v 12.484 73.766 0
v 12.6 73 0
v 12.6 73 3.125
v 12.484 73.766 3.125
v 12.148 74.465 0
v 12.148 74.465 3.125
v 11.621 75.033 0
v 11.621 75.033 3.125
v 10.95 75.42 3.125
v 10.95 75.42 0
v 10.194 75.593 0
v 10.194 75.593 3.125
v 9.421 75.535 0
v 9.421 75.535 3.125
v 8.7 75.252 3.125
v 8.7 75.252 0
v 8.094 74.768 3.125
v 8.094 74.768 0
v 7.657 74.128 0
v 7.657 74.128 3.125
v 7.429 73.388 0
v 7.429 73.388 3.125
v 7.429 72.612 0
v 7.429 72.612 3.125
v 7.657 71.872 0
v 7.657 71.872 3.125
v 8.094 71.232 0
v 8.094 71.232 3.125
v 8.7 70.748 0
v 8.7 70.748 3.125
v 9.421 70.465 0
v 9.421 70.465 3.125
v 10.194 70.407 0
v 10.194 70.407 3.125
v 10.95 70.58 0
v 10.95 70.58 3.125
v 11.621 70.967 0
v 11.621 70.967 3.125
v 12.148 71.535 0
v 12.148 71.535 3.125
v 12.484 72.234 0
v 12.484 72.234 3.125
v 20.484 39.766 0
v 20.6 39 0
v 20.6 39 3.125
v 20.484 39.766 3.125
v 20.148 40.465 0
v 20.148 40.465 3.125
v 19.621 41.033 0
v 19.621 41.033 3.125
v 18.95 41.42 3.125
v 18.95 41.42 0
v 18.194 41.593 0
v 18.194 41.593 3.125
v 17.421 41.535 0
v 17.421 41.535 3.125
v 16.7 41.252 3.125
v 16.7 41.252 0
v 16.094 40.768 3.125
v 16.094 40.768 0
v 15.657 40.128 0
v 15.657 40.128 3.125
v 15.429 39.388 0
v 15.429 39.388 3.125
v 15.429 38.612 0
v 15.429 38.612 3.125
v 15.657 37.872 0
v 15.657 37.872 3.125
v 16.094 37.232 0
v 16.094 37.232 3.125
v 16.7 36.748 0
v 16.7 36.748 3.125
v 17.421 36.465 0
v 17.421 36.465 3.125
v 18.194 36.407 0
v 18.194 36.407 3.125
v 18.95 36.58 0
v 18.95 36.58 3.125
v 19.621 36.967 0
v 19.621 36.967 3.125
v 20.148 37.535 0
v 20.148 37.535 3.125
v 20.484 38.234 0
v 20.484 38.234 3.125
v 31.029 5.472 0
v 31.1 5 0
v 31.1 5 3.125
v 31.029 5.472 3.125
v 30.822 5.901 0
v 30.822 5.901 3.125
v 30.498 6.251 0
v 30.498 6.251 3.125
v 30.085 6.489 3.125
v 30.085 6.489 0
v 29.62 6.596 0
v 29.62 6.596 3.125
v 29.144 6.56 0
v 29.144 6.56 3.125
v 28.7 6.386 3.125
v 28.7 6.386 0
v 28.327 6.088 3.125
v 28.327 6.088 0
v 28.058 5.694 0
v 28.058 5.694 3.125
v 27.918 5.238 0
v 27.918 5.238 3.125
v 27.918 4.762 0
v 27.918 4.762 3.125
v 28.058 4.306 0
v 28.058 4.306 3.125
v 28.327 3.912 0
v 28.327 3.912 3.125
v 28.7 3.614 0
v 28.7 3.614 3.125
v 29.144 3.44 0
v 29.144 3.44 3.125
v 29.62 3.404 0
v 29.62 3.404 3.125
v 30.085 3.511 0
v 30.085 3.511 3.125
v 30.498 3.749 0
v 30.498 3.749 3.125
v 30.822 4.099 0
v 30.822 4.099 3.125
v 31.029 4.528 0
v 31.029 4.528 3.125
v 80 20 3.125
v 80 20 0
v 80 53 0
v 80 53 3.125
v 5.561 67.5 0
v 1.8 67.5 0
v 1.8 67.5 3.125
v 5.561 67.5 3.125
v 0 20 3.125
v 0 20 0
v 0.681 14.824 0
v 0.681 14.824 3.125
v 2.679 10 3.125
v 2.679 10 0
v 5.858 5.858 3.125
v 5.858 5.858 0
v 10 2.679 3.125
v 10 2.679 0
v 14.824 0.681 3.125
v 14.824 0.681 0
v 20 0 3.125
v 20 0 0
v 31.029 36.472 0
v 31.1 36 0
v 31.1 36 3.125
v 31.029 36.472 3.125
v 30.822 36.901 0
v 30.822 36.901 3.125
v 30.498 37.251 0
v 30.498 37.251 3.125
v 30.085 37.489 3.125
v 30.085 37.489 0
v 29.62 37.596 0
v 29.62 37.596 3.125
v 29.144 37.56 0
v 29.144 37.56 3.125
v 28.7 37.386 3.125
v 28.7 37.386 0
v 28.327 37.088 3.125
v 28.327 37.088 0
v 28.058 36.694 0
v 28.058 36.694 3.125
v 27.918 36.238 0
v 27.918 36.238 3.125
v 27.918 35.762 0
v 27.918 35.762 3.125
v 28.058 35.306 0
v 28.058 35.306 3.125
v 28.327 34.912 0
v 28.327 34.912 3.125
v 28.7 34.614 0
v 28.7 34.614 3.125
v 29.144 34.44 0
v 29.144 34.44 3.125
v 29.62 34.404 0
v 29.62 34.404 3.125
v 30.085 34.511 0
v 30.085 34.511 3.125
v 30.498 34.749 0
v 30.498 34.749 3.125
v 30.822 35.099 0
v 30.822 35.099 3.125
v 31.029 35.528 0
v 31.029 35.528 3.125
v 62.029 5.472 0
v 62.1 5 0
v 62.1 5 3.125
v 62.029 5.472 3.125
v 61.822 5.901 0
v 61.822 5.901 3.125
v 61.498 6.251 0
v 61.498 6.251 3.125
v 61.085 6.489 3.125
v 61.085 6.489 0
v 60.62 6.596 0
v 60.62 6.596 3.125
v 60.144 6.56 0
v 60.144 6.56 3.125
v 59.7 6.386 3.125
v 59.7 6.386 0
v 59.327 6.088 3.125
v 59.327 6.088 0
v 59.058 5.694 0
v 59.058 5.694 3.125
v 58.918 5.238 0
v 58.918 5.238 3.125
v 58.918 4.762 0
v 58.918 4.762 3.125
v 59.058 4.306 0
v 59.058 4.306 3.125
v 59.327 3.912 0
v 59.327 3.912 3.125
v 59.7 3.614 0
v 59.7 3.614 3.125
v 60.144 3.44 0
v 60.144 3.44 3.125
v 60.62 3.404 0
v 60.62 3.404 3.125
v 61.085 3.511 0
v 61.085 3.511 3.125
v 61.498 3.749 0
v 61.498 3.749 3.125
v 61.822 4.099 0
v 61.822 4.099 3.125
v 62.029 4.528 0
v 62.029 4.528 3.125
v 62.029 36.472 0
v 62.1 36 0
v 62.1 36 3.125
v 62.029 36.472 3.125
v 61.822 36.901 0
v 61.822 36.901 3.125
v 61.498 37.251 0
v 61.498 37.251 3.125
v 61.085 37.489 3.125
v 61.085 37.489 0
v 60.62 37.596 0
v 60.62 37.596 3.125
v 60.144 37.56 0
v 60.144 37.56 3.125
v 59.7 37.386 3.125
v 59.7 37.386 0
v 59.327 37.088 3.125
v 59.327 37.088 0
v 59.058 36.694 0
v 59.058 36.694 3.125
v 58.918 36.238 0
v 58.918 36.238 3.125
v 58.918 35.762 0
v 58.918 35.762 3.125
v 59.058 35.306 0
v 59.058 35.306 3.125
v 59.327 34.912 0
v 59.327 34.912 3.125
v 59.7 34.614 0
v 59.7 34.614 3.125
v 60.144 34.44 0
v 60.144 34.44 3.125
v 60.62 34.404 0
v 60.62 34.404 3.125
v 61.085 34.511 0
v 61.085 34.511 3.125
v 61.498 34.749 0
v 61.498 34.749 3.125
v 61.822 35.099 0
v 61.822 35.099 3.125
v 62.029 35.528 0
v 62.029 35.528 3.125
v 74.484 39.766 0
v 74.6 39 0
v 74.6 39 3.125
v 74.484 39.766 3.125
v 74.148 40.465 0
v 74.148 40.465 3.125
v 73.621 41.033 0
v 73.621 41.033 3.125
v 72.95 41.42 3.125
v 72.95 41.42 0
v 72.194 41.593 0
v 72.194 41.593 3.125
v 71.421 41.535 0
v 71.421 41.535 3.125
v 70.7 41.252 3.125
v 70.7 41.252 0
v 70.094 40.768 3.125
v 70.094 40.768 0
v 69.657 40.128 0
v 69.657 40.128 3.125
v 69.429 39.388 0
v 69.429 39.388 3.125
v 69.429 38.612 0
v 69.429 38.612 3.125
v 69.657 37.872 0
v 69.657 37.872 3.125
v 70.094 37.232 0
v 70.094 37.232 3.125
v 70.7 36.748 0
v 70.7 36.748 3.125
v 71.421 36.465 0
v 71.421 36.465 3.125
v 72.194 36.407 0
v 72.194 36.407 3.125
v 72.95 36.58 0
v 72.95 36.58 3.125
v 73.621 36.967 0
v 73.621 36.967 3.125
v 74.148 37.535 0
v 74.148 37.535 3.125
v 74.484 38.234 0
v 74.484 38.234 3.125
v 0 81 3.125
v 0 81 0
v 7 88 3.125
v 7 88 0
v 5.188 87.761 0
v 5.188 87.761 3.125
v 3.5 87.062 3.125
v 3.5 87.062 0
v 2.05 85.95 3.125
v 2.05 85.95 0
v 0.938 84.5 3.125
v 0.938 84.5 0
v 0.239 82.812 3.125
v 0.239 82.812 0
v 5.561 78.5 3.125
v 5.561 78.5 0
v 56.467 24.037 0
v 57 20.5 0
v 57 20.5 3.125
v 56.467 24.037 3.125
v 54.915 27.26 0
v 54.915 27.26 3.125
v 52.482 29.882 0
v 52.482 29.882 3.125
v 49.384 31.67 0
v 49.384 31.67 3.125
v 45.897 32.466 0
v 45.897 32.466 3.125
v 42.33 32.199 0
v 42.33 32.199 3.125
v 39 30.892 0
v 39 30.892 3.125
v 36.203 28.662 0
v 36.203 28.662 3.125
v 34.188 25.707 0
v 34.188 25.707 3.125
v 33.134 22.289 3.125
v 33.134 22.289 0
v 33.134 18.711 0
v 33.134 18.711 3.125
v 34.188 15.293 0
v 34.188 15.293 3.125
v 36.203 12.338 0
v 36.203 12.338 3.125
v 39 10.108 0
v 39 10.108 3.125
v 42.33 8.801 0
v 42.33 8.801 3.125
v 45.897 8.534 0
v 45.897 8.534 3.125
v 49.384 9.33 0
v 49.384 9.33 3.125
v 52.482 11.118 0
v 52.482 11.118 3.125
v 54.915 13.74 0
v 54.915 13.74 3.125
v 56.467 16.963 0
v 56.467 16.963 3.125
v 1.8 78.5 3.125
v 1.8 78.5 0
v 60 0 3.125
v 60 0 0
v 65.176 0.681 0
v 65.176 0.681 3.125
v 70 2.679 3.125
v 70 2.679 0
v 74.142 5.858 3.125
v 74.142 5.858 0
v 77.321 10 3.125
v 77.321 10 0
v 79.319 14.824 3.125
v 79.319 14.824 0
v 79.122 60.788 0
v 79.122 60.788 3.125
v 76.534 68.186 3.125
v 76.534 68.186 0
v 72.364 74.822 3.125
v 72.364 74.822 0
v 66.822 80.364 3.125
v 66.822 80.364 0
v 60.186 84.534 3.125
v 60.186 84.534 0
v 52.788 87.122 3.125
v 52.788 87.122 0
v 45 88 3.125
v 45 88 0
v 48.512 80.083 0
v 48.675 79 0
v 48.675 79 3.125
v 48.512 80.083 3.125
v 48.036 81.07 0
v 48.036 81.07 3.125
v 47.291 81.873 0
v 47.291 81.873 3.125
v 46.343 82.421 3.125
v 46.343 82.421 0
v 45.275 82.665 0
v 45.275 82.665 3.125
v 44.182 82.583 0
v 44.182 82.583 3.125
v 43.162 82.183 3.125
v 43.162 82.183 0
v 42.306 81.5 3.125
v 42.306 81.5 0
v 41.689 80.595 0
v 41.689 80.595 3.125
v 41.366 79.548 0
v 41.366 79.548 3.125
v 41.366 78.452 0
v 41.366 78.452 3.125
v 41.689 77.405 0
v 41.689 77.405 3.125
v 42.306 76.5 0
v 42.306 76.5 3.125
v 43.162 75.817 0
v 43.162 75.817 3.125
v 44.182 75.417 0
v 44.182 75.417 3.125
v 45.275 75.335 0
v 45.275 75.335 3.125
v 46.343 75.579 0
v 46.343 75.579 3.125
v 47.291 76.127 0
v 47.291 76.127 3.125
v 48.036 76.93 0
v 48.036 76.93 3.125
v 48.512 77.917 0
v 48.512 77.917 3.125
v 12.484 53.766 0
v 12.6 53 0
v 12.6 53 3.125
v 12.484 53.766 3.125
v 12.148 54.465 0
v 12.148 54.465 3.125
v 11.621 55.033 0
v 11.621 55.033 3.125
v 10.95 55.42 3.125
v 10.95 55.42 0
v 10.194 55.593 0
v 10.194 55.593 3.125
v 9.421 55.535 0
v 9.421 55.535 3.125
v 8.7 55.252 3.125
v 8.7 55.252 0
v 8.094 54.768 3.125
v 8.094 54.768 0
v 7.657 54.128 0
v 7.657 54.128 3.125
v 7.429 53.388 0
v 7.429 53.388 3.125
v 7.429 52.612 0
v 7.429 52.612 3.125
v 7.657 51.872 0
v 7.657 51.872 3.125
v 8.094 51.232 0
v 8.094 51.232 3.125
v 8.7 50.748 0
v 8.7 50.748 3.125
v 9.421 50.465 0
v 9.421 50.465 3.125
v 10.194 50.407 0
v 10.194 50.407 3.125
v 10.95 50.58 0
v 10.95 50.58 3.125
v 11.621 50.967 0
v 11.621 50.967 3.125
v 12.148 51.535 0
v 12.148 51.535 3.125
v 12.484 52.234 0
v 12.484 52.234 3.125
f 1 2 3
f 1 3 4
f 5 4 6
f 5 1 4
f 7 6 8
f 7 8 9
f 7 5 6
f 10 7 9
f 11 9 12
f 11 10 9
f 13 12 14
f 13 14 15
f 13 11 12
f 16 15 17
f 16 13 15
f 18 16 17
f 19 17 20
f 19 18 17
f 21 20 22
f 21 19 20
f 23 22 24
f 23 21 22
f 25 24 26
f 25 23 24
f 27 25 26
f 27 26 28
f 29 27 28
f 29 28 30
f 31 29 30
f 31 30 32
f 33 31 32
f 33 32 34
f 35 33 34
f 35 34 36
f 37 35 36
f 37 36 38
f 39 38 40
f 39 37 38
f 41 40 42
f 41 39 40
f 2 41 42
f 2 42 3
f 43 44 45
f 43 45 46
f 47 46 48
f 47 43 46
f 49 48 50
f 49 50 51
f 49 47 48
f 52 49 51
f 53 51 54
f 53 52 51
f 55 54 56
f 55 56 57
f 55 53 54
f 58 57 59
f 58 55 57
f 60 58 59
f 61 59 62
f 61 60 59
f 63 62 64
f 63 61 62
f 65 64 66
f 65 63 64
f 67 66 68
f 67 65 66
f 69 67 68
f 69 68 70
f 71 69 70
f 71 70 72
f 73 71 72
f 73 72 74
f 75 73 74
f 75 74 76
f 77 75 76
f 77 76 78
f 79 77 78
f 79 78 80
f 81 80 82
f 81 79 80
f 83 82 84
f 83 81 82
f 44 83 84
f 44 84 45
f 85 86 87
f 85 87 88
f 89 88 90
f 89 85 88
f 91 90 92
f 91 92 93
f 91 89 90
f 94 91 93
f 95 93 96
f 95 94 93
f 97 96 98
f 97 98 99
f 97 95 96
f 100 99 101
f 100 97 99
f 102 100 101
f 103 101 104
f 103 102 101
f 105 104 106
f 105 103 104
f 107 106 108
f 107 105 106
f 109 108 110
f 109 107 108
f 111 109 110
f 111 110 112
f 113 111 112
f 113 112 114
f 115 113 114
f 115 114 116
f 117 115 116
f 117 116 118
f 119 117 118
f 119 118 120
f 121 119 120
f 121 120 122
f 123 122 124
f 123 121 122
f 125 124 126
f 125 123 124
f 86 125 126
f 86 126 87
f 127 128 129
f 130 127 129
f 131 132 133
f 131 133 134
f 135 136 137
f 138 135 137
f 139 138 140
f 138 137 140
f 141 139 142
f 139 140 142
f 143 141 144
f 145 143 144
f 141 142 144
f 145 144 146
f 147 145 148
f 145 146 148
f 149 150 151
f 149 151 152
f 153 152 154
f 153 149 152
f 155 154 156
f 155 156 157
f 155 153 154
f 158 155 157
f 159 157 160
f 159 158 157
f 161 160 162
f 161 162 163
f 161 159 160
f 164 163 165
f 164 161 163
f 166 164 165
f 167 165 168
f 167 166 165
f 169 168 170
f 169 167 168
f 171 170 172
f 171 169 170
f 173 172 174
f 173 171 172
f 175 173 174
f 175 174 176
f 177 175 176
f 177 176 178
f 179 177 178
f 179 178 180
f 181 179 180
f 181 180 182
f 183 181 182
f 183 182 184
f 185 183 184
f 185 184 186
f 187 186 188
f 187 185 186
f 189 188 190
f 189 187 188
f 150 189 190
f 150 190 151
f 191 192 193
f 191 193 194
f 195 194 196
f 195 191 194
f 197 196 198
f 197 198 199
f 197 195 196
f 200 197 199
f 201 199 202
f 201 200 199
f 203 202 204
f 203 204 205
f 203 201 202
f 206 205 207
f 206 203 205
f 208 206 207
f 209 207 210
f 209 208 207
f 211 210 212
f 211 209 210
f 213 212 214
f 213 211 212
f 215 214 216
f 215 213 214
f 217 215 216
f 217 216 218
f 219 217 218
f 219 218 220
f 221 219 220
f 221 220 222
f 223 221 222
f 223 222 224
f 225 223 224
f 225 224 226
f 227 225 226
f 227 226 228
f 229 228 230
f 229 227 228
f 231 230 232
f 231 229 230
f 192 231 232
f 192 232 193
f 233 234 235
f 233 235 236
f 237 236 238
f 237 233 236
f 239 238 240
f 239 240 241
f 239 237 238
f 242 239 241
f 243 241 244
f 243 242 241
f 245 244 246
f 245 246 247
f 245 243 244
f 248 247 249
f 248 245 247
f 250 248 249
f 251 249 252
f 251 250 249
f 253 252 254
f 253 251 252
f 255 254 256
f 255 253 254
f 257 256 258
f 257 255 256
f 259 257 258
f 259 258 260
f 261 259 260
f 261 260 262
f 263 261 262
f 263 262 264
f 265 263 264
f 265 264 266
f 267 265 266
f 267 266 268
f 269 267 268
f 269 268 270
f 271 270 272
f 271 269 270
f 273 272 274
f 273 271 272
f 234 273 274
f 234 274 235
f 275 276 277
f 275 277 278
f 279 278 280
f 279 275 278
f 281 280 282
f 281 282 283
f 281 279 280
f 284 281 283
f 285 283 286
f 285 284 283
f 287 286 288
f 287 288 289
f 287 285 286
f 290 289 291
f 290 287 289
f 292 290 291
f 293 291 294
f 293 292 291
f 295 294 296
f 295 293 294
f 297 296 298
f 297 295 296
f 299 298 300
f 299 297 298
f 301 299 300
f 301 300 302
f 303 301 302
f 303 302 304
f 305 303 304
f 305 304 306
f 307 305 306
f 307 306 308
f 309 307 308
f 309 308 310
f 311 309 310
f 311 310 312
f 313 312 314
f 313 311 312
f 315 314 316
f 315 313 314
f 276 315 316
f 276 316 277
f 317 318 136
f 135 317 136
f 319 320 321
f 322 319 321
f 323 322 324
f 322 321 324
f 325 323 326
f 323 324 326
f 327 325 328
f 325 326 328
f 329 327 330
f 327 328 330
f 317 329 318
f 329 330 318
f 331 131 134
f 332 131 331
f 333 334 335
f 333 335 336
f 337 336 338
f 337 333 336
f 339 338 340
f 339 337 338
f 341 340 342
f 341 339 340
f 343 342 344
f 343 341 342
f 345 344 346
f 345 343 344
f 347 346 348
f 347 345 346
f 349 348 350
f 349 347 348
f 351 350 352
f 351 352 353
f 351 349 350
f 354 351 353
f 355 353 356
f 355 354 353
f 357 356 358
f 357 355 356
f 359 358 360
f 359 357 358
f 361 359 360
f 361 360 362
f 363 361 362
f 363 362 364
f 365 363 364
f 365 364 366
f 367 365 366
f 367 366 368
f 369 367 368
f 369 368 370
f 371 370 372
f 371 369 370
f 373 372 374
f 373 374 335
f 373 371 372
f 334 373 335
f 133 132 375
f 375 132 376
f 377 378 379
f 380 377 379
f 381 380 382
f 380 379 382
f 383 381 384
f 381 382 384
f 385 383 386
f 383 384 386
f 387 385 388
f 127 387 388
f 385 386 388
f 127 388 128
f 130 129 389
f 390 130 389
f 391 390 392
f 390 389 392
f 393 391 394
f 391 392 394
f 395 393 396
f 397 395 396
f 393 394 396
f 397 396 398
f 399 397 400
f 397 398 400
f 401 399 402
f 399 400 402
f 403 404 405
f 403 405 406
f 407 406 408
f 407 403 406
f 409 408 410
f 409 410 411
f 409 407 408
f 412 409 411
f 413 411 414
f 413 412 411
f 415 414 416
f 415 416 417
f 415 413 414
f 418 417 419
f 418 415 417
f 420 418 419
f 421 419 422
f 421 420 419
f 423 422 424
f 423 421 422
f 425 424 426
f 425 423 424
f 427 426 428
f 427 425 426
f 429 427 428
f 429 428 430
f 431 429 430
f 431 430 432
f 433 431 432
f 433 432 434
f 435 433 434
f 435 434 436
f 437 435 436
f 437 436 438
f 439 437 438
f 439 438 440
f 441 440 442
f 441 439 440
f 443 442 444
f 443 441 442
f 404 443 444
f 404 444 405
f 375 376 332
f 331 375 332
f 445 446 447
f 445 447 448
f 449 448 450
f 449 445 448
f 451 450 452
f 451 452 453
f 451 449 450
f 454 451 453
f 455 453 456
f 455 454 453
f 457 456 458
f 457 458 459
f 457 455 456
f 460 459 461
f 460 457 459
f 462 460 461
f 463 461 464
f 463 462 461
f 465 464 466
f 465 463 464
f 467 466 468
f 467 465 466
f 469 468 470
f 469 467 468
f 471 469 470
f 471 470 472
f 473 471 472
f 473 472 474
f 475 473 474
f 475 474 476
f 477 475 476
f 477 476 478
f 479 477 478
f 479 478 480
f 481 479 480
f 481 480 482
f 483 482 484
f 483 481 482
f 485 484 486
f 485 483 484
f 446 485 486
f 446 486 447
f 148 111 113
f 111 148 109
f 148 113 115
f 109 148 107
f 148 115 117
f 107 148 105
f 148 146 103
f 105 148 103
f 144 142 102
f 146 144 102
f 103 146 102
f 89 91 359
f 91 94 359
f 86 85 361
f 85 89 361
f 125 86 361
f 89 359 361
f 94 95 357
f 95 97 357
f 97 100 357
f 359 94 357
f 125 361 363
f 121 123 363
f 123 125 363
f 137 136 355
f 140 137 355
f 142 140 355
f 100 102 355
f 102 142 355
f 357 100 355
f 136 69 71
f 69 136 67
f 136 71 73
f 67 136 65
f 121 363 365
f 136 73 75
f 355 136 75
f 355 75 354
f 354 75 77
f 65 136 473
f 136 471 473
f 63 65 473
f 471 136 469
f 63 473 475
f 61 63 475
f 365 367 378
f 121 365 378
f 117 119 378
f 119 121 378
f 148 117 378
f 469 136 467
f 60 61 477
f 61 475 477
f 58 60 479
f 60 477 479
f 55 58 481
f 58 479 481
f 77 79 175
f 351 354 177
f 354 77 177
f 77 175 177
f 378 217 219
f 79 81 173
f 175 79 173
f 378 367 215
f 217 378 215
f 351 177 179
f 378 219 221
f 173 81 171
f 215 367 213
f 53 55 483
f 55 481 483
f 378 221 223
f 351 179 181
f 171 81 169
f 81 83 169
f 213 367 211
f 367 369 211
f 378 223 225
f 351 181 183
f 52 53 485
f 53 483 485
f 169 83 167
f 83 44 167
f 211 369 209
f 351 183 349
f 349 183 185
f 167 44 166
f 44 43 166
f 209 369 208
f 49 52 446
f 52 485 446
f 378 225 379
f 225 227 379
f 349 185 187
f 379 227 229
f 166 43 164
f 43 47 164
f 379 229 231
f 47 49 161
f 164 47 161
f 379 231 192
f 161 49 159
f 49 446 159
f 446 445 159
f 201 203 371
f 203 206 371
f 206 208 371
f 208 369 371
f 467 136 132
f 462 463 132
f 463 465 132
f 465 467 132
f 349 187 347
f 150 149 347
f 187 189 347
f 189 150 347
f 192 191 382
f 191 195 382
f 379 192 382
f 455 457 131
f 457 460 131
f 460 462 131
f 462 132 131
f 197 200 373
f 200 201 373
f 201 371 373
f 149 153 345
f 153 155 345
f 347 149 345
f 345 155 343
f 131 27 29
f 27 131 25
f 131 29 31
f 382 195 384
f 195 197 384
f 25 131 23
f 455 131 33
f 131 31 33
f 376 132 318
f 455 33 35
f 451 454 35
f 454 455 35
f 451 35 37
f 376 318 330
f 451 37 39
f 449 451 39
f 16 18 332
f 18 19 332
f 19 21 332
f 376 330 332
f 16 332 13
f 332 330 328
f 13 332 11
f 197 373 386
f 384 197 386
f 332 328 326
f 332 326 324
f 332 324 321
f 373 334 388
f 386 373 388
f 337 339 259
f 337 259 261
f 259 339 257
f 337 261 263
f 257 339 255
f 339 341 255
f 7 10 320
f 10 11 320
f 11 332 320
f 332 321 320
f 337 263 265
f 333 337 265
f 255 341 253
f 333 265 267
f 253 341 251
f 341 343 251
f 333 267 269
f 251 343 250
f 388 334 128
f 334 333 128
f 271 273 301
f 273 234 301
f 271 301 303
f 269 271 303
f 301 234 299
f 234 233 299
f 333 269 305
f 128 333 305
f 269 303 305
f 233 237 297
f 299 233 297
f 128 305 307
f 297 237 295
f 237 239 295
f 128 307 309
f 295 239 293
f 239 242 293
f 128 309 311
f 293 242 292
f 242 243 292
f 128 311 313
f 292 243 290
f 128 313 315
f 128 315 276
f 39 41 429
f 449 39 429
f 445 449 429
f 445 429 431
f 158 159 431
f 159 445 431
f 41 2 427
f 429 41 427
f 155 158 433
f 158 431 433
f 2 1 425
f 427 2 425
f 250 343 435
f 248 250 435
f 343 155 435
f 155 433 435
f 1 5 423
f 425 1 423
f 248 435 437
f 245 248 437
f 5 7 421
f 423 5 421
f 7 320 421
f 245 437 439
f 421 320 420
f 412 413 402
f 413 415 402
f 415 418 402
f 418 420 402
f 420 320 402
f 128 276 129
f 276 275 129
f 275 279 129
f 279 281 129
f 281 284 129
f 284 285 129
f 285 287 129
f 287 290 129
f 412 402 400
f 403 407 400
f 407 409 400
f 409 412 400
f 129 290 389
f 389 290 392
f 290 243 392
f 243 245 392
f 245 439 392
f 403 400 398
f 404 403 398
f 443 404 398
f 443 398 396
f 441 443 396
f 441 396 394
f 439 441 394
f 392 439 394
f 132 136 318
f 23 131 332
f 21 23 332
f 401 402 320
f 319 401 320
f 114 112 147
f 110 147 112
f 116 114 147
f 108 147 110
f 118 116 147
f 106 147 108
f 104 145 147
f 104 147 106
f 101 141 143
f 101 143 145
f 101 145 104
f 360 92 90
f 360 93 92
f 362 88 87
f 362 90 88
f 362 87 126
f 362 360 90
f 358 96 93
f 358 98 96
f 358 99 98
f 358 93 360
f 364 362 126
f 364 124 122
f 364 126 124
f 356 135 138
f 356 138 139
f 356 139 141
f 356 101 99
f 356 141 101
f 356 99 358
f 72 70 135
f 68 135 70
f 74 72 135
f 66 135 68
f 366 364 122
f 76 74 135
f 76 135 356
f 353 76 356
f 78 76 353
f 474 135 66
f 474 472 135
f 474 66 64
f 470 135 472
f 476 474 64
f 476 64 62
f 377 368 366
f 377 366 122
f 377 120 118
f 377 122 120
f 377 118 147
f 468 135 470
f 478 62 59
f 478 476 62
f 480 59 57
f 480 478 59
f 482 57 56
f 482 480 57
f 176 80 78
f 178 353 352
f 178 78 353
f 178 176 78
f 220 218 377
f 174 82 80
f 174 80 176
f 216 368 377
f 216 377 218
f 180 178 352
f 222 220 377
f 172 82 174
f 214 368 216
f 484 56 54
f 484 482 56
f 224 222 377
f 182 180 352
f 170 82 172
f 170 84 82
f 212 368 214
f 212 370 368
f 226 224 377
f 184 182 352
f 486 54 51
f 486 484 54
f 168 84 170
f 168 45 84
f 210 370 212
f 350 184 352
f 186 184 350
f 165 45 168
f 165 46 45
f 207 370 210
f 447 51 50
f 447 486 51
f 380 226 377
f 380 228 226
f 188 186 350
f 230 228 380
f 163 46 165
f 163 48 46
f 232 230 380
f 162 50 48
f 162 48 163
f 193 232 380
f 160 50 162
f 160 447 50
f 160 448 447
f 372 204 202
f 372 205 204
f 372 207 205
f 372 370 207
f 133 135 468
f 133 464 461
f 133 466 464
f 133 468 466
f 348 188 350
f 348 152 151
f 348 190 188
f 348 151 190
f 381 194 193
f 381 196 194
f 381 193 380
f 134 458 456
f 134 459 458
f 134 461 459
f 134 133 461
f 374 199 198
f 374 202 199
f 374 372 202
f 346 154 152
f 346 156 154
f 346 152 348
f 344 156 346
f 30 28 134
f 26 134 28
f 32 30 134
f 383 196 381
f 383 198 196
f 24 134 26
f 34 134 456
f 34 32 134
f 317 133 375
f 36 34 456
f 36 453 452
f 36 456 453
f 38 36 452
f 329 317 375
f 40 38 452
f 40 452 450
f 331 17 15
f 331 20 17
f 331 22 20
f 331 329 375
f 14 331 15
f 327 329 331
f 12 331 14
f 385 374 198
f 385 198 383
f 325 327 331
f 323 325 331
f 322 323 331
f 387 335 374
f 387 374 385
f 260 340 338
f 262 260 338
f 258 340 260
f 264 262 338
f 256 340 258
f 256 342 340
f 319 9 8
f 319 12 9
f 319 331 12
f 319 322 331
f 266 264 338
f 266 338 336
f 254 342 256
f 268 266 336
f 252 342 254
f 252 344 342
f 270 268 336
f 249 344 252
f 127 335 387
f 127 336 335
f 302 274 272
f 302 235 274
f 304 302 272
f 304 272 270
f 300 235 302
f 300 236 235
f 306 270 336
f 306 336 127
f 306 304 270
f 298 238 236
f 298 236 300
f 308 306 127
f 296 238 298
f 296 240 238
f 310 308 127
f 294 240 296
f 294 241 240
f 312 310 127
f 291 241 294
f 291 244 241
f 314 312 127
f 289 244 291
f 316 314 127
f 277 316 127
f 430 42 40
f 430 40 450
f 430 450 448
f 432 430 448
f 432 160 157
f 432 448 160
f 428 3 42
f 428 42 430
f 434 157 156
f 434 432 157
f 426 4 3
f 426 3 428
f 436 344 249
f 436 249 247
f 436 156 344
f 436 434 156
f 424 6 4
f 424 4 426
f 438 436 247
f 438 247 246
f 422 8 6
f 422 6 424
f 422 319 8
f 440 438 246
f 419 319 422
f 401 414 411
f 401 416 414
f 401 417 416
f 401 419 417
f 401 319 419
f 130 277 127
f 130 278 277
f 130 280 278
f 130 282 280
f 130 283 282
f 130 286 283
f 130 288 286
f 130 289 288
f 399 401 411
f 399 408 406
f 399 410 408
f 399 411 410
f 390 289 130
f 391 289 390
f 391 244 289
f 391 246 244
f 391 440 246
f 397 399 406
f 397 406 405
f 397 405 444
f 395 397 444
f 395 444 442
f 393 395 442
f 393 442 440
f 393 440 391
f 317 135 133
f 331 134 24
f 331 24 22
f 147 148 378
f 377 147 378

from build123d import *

# Parameters (mm, degrees)
MODEL_R             = 2.6
MODEL_R_2           = 12
MODEL_R_3           = 1.6
MODEL_R_4           = 3.675
MODEL_W             = 3.760660172
MODEL_H             = 11
BOSS_EXTRUDE1_DEPTH = 3.125


with BuildPart() as part:
    # Model → Boss-Extrude1 (new body)
    with BuildSketch(Plane.XY):
        with BuildLine():
            Line((80, 20), (80, 53))
            ThreePointArc((80, 53), (69.748737342, 77.748737342), (45, 88))
            Line((45, 88), (7, 88))
            ThreePointArc((7, 88), (2.050252532, 85.949747468), (0, 81))
            Line((0, 81), (0, 20))
            ThreePointArc((0, 20), (5.857864376, 5.857864376), (20, 0))
            Line((20, 0), (60, 0))
            ThreePointArc((60, 0), (74.142135624, 5.857864376), (80, 20))
        make_face()
        with Locations((10, 73)):
            Circle(MODEL_R, mode=Mode.SUBTRACT)
        with Locations((45, 20.5)):
            Circle(MODEL_R_2, mode=Mode.SUBTRACT)
        with Locations((18, 39)):
            Circle(MODEL_R, mode=Mode.SUBTRACT)
        with Locations((60.5, 36)):
            Circle(MODEL_R_3, mode=Mode.SUBTRACT)
        with Locations((29.5, 5)):
            Circle(MODEL_R_3, mode=Mode.SUBTRACT)
        with Locations((45, 79)):
            Circle(MODEL_R_4, mode=Mode.SUBTRACT)
        with Locations((10, 53)):
            Circle(MODEL_R, mode=Mode.SUBTRACT)
        with Locations((29.5, 36)):
            Circle(MODEL_R_3, mode=Mode.SUBTRACT)
        with Locations((60.5, 5)):
            Circle(MODEL_R_3, mode=Mode.SUBTRACT)
        with Locations((72, 39)):
            Circle(MODEL_R, mode=Mode.SUBTRACT)
        with Locations((3.680330086, 73)):
            Rectangle(MODEL_W, MODEL_H, mode=Mode.SUBTRACT)
    extrude(amount=BOSS_EXTRUDE1_DEPTH)


solid = part.part
